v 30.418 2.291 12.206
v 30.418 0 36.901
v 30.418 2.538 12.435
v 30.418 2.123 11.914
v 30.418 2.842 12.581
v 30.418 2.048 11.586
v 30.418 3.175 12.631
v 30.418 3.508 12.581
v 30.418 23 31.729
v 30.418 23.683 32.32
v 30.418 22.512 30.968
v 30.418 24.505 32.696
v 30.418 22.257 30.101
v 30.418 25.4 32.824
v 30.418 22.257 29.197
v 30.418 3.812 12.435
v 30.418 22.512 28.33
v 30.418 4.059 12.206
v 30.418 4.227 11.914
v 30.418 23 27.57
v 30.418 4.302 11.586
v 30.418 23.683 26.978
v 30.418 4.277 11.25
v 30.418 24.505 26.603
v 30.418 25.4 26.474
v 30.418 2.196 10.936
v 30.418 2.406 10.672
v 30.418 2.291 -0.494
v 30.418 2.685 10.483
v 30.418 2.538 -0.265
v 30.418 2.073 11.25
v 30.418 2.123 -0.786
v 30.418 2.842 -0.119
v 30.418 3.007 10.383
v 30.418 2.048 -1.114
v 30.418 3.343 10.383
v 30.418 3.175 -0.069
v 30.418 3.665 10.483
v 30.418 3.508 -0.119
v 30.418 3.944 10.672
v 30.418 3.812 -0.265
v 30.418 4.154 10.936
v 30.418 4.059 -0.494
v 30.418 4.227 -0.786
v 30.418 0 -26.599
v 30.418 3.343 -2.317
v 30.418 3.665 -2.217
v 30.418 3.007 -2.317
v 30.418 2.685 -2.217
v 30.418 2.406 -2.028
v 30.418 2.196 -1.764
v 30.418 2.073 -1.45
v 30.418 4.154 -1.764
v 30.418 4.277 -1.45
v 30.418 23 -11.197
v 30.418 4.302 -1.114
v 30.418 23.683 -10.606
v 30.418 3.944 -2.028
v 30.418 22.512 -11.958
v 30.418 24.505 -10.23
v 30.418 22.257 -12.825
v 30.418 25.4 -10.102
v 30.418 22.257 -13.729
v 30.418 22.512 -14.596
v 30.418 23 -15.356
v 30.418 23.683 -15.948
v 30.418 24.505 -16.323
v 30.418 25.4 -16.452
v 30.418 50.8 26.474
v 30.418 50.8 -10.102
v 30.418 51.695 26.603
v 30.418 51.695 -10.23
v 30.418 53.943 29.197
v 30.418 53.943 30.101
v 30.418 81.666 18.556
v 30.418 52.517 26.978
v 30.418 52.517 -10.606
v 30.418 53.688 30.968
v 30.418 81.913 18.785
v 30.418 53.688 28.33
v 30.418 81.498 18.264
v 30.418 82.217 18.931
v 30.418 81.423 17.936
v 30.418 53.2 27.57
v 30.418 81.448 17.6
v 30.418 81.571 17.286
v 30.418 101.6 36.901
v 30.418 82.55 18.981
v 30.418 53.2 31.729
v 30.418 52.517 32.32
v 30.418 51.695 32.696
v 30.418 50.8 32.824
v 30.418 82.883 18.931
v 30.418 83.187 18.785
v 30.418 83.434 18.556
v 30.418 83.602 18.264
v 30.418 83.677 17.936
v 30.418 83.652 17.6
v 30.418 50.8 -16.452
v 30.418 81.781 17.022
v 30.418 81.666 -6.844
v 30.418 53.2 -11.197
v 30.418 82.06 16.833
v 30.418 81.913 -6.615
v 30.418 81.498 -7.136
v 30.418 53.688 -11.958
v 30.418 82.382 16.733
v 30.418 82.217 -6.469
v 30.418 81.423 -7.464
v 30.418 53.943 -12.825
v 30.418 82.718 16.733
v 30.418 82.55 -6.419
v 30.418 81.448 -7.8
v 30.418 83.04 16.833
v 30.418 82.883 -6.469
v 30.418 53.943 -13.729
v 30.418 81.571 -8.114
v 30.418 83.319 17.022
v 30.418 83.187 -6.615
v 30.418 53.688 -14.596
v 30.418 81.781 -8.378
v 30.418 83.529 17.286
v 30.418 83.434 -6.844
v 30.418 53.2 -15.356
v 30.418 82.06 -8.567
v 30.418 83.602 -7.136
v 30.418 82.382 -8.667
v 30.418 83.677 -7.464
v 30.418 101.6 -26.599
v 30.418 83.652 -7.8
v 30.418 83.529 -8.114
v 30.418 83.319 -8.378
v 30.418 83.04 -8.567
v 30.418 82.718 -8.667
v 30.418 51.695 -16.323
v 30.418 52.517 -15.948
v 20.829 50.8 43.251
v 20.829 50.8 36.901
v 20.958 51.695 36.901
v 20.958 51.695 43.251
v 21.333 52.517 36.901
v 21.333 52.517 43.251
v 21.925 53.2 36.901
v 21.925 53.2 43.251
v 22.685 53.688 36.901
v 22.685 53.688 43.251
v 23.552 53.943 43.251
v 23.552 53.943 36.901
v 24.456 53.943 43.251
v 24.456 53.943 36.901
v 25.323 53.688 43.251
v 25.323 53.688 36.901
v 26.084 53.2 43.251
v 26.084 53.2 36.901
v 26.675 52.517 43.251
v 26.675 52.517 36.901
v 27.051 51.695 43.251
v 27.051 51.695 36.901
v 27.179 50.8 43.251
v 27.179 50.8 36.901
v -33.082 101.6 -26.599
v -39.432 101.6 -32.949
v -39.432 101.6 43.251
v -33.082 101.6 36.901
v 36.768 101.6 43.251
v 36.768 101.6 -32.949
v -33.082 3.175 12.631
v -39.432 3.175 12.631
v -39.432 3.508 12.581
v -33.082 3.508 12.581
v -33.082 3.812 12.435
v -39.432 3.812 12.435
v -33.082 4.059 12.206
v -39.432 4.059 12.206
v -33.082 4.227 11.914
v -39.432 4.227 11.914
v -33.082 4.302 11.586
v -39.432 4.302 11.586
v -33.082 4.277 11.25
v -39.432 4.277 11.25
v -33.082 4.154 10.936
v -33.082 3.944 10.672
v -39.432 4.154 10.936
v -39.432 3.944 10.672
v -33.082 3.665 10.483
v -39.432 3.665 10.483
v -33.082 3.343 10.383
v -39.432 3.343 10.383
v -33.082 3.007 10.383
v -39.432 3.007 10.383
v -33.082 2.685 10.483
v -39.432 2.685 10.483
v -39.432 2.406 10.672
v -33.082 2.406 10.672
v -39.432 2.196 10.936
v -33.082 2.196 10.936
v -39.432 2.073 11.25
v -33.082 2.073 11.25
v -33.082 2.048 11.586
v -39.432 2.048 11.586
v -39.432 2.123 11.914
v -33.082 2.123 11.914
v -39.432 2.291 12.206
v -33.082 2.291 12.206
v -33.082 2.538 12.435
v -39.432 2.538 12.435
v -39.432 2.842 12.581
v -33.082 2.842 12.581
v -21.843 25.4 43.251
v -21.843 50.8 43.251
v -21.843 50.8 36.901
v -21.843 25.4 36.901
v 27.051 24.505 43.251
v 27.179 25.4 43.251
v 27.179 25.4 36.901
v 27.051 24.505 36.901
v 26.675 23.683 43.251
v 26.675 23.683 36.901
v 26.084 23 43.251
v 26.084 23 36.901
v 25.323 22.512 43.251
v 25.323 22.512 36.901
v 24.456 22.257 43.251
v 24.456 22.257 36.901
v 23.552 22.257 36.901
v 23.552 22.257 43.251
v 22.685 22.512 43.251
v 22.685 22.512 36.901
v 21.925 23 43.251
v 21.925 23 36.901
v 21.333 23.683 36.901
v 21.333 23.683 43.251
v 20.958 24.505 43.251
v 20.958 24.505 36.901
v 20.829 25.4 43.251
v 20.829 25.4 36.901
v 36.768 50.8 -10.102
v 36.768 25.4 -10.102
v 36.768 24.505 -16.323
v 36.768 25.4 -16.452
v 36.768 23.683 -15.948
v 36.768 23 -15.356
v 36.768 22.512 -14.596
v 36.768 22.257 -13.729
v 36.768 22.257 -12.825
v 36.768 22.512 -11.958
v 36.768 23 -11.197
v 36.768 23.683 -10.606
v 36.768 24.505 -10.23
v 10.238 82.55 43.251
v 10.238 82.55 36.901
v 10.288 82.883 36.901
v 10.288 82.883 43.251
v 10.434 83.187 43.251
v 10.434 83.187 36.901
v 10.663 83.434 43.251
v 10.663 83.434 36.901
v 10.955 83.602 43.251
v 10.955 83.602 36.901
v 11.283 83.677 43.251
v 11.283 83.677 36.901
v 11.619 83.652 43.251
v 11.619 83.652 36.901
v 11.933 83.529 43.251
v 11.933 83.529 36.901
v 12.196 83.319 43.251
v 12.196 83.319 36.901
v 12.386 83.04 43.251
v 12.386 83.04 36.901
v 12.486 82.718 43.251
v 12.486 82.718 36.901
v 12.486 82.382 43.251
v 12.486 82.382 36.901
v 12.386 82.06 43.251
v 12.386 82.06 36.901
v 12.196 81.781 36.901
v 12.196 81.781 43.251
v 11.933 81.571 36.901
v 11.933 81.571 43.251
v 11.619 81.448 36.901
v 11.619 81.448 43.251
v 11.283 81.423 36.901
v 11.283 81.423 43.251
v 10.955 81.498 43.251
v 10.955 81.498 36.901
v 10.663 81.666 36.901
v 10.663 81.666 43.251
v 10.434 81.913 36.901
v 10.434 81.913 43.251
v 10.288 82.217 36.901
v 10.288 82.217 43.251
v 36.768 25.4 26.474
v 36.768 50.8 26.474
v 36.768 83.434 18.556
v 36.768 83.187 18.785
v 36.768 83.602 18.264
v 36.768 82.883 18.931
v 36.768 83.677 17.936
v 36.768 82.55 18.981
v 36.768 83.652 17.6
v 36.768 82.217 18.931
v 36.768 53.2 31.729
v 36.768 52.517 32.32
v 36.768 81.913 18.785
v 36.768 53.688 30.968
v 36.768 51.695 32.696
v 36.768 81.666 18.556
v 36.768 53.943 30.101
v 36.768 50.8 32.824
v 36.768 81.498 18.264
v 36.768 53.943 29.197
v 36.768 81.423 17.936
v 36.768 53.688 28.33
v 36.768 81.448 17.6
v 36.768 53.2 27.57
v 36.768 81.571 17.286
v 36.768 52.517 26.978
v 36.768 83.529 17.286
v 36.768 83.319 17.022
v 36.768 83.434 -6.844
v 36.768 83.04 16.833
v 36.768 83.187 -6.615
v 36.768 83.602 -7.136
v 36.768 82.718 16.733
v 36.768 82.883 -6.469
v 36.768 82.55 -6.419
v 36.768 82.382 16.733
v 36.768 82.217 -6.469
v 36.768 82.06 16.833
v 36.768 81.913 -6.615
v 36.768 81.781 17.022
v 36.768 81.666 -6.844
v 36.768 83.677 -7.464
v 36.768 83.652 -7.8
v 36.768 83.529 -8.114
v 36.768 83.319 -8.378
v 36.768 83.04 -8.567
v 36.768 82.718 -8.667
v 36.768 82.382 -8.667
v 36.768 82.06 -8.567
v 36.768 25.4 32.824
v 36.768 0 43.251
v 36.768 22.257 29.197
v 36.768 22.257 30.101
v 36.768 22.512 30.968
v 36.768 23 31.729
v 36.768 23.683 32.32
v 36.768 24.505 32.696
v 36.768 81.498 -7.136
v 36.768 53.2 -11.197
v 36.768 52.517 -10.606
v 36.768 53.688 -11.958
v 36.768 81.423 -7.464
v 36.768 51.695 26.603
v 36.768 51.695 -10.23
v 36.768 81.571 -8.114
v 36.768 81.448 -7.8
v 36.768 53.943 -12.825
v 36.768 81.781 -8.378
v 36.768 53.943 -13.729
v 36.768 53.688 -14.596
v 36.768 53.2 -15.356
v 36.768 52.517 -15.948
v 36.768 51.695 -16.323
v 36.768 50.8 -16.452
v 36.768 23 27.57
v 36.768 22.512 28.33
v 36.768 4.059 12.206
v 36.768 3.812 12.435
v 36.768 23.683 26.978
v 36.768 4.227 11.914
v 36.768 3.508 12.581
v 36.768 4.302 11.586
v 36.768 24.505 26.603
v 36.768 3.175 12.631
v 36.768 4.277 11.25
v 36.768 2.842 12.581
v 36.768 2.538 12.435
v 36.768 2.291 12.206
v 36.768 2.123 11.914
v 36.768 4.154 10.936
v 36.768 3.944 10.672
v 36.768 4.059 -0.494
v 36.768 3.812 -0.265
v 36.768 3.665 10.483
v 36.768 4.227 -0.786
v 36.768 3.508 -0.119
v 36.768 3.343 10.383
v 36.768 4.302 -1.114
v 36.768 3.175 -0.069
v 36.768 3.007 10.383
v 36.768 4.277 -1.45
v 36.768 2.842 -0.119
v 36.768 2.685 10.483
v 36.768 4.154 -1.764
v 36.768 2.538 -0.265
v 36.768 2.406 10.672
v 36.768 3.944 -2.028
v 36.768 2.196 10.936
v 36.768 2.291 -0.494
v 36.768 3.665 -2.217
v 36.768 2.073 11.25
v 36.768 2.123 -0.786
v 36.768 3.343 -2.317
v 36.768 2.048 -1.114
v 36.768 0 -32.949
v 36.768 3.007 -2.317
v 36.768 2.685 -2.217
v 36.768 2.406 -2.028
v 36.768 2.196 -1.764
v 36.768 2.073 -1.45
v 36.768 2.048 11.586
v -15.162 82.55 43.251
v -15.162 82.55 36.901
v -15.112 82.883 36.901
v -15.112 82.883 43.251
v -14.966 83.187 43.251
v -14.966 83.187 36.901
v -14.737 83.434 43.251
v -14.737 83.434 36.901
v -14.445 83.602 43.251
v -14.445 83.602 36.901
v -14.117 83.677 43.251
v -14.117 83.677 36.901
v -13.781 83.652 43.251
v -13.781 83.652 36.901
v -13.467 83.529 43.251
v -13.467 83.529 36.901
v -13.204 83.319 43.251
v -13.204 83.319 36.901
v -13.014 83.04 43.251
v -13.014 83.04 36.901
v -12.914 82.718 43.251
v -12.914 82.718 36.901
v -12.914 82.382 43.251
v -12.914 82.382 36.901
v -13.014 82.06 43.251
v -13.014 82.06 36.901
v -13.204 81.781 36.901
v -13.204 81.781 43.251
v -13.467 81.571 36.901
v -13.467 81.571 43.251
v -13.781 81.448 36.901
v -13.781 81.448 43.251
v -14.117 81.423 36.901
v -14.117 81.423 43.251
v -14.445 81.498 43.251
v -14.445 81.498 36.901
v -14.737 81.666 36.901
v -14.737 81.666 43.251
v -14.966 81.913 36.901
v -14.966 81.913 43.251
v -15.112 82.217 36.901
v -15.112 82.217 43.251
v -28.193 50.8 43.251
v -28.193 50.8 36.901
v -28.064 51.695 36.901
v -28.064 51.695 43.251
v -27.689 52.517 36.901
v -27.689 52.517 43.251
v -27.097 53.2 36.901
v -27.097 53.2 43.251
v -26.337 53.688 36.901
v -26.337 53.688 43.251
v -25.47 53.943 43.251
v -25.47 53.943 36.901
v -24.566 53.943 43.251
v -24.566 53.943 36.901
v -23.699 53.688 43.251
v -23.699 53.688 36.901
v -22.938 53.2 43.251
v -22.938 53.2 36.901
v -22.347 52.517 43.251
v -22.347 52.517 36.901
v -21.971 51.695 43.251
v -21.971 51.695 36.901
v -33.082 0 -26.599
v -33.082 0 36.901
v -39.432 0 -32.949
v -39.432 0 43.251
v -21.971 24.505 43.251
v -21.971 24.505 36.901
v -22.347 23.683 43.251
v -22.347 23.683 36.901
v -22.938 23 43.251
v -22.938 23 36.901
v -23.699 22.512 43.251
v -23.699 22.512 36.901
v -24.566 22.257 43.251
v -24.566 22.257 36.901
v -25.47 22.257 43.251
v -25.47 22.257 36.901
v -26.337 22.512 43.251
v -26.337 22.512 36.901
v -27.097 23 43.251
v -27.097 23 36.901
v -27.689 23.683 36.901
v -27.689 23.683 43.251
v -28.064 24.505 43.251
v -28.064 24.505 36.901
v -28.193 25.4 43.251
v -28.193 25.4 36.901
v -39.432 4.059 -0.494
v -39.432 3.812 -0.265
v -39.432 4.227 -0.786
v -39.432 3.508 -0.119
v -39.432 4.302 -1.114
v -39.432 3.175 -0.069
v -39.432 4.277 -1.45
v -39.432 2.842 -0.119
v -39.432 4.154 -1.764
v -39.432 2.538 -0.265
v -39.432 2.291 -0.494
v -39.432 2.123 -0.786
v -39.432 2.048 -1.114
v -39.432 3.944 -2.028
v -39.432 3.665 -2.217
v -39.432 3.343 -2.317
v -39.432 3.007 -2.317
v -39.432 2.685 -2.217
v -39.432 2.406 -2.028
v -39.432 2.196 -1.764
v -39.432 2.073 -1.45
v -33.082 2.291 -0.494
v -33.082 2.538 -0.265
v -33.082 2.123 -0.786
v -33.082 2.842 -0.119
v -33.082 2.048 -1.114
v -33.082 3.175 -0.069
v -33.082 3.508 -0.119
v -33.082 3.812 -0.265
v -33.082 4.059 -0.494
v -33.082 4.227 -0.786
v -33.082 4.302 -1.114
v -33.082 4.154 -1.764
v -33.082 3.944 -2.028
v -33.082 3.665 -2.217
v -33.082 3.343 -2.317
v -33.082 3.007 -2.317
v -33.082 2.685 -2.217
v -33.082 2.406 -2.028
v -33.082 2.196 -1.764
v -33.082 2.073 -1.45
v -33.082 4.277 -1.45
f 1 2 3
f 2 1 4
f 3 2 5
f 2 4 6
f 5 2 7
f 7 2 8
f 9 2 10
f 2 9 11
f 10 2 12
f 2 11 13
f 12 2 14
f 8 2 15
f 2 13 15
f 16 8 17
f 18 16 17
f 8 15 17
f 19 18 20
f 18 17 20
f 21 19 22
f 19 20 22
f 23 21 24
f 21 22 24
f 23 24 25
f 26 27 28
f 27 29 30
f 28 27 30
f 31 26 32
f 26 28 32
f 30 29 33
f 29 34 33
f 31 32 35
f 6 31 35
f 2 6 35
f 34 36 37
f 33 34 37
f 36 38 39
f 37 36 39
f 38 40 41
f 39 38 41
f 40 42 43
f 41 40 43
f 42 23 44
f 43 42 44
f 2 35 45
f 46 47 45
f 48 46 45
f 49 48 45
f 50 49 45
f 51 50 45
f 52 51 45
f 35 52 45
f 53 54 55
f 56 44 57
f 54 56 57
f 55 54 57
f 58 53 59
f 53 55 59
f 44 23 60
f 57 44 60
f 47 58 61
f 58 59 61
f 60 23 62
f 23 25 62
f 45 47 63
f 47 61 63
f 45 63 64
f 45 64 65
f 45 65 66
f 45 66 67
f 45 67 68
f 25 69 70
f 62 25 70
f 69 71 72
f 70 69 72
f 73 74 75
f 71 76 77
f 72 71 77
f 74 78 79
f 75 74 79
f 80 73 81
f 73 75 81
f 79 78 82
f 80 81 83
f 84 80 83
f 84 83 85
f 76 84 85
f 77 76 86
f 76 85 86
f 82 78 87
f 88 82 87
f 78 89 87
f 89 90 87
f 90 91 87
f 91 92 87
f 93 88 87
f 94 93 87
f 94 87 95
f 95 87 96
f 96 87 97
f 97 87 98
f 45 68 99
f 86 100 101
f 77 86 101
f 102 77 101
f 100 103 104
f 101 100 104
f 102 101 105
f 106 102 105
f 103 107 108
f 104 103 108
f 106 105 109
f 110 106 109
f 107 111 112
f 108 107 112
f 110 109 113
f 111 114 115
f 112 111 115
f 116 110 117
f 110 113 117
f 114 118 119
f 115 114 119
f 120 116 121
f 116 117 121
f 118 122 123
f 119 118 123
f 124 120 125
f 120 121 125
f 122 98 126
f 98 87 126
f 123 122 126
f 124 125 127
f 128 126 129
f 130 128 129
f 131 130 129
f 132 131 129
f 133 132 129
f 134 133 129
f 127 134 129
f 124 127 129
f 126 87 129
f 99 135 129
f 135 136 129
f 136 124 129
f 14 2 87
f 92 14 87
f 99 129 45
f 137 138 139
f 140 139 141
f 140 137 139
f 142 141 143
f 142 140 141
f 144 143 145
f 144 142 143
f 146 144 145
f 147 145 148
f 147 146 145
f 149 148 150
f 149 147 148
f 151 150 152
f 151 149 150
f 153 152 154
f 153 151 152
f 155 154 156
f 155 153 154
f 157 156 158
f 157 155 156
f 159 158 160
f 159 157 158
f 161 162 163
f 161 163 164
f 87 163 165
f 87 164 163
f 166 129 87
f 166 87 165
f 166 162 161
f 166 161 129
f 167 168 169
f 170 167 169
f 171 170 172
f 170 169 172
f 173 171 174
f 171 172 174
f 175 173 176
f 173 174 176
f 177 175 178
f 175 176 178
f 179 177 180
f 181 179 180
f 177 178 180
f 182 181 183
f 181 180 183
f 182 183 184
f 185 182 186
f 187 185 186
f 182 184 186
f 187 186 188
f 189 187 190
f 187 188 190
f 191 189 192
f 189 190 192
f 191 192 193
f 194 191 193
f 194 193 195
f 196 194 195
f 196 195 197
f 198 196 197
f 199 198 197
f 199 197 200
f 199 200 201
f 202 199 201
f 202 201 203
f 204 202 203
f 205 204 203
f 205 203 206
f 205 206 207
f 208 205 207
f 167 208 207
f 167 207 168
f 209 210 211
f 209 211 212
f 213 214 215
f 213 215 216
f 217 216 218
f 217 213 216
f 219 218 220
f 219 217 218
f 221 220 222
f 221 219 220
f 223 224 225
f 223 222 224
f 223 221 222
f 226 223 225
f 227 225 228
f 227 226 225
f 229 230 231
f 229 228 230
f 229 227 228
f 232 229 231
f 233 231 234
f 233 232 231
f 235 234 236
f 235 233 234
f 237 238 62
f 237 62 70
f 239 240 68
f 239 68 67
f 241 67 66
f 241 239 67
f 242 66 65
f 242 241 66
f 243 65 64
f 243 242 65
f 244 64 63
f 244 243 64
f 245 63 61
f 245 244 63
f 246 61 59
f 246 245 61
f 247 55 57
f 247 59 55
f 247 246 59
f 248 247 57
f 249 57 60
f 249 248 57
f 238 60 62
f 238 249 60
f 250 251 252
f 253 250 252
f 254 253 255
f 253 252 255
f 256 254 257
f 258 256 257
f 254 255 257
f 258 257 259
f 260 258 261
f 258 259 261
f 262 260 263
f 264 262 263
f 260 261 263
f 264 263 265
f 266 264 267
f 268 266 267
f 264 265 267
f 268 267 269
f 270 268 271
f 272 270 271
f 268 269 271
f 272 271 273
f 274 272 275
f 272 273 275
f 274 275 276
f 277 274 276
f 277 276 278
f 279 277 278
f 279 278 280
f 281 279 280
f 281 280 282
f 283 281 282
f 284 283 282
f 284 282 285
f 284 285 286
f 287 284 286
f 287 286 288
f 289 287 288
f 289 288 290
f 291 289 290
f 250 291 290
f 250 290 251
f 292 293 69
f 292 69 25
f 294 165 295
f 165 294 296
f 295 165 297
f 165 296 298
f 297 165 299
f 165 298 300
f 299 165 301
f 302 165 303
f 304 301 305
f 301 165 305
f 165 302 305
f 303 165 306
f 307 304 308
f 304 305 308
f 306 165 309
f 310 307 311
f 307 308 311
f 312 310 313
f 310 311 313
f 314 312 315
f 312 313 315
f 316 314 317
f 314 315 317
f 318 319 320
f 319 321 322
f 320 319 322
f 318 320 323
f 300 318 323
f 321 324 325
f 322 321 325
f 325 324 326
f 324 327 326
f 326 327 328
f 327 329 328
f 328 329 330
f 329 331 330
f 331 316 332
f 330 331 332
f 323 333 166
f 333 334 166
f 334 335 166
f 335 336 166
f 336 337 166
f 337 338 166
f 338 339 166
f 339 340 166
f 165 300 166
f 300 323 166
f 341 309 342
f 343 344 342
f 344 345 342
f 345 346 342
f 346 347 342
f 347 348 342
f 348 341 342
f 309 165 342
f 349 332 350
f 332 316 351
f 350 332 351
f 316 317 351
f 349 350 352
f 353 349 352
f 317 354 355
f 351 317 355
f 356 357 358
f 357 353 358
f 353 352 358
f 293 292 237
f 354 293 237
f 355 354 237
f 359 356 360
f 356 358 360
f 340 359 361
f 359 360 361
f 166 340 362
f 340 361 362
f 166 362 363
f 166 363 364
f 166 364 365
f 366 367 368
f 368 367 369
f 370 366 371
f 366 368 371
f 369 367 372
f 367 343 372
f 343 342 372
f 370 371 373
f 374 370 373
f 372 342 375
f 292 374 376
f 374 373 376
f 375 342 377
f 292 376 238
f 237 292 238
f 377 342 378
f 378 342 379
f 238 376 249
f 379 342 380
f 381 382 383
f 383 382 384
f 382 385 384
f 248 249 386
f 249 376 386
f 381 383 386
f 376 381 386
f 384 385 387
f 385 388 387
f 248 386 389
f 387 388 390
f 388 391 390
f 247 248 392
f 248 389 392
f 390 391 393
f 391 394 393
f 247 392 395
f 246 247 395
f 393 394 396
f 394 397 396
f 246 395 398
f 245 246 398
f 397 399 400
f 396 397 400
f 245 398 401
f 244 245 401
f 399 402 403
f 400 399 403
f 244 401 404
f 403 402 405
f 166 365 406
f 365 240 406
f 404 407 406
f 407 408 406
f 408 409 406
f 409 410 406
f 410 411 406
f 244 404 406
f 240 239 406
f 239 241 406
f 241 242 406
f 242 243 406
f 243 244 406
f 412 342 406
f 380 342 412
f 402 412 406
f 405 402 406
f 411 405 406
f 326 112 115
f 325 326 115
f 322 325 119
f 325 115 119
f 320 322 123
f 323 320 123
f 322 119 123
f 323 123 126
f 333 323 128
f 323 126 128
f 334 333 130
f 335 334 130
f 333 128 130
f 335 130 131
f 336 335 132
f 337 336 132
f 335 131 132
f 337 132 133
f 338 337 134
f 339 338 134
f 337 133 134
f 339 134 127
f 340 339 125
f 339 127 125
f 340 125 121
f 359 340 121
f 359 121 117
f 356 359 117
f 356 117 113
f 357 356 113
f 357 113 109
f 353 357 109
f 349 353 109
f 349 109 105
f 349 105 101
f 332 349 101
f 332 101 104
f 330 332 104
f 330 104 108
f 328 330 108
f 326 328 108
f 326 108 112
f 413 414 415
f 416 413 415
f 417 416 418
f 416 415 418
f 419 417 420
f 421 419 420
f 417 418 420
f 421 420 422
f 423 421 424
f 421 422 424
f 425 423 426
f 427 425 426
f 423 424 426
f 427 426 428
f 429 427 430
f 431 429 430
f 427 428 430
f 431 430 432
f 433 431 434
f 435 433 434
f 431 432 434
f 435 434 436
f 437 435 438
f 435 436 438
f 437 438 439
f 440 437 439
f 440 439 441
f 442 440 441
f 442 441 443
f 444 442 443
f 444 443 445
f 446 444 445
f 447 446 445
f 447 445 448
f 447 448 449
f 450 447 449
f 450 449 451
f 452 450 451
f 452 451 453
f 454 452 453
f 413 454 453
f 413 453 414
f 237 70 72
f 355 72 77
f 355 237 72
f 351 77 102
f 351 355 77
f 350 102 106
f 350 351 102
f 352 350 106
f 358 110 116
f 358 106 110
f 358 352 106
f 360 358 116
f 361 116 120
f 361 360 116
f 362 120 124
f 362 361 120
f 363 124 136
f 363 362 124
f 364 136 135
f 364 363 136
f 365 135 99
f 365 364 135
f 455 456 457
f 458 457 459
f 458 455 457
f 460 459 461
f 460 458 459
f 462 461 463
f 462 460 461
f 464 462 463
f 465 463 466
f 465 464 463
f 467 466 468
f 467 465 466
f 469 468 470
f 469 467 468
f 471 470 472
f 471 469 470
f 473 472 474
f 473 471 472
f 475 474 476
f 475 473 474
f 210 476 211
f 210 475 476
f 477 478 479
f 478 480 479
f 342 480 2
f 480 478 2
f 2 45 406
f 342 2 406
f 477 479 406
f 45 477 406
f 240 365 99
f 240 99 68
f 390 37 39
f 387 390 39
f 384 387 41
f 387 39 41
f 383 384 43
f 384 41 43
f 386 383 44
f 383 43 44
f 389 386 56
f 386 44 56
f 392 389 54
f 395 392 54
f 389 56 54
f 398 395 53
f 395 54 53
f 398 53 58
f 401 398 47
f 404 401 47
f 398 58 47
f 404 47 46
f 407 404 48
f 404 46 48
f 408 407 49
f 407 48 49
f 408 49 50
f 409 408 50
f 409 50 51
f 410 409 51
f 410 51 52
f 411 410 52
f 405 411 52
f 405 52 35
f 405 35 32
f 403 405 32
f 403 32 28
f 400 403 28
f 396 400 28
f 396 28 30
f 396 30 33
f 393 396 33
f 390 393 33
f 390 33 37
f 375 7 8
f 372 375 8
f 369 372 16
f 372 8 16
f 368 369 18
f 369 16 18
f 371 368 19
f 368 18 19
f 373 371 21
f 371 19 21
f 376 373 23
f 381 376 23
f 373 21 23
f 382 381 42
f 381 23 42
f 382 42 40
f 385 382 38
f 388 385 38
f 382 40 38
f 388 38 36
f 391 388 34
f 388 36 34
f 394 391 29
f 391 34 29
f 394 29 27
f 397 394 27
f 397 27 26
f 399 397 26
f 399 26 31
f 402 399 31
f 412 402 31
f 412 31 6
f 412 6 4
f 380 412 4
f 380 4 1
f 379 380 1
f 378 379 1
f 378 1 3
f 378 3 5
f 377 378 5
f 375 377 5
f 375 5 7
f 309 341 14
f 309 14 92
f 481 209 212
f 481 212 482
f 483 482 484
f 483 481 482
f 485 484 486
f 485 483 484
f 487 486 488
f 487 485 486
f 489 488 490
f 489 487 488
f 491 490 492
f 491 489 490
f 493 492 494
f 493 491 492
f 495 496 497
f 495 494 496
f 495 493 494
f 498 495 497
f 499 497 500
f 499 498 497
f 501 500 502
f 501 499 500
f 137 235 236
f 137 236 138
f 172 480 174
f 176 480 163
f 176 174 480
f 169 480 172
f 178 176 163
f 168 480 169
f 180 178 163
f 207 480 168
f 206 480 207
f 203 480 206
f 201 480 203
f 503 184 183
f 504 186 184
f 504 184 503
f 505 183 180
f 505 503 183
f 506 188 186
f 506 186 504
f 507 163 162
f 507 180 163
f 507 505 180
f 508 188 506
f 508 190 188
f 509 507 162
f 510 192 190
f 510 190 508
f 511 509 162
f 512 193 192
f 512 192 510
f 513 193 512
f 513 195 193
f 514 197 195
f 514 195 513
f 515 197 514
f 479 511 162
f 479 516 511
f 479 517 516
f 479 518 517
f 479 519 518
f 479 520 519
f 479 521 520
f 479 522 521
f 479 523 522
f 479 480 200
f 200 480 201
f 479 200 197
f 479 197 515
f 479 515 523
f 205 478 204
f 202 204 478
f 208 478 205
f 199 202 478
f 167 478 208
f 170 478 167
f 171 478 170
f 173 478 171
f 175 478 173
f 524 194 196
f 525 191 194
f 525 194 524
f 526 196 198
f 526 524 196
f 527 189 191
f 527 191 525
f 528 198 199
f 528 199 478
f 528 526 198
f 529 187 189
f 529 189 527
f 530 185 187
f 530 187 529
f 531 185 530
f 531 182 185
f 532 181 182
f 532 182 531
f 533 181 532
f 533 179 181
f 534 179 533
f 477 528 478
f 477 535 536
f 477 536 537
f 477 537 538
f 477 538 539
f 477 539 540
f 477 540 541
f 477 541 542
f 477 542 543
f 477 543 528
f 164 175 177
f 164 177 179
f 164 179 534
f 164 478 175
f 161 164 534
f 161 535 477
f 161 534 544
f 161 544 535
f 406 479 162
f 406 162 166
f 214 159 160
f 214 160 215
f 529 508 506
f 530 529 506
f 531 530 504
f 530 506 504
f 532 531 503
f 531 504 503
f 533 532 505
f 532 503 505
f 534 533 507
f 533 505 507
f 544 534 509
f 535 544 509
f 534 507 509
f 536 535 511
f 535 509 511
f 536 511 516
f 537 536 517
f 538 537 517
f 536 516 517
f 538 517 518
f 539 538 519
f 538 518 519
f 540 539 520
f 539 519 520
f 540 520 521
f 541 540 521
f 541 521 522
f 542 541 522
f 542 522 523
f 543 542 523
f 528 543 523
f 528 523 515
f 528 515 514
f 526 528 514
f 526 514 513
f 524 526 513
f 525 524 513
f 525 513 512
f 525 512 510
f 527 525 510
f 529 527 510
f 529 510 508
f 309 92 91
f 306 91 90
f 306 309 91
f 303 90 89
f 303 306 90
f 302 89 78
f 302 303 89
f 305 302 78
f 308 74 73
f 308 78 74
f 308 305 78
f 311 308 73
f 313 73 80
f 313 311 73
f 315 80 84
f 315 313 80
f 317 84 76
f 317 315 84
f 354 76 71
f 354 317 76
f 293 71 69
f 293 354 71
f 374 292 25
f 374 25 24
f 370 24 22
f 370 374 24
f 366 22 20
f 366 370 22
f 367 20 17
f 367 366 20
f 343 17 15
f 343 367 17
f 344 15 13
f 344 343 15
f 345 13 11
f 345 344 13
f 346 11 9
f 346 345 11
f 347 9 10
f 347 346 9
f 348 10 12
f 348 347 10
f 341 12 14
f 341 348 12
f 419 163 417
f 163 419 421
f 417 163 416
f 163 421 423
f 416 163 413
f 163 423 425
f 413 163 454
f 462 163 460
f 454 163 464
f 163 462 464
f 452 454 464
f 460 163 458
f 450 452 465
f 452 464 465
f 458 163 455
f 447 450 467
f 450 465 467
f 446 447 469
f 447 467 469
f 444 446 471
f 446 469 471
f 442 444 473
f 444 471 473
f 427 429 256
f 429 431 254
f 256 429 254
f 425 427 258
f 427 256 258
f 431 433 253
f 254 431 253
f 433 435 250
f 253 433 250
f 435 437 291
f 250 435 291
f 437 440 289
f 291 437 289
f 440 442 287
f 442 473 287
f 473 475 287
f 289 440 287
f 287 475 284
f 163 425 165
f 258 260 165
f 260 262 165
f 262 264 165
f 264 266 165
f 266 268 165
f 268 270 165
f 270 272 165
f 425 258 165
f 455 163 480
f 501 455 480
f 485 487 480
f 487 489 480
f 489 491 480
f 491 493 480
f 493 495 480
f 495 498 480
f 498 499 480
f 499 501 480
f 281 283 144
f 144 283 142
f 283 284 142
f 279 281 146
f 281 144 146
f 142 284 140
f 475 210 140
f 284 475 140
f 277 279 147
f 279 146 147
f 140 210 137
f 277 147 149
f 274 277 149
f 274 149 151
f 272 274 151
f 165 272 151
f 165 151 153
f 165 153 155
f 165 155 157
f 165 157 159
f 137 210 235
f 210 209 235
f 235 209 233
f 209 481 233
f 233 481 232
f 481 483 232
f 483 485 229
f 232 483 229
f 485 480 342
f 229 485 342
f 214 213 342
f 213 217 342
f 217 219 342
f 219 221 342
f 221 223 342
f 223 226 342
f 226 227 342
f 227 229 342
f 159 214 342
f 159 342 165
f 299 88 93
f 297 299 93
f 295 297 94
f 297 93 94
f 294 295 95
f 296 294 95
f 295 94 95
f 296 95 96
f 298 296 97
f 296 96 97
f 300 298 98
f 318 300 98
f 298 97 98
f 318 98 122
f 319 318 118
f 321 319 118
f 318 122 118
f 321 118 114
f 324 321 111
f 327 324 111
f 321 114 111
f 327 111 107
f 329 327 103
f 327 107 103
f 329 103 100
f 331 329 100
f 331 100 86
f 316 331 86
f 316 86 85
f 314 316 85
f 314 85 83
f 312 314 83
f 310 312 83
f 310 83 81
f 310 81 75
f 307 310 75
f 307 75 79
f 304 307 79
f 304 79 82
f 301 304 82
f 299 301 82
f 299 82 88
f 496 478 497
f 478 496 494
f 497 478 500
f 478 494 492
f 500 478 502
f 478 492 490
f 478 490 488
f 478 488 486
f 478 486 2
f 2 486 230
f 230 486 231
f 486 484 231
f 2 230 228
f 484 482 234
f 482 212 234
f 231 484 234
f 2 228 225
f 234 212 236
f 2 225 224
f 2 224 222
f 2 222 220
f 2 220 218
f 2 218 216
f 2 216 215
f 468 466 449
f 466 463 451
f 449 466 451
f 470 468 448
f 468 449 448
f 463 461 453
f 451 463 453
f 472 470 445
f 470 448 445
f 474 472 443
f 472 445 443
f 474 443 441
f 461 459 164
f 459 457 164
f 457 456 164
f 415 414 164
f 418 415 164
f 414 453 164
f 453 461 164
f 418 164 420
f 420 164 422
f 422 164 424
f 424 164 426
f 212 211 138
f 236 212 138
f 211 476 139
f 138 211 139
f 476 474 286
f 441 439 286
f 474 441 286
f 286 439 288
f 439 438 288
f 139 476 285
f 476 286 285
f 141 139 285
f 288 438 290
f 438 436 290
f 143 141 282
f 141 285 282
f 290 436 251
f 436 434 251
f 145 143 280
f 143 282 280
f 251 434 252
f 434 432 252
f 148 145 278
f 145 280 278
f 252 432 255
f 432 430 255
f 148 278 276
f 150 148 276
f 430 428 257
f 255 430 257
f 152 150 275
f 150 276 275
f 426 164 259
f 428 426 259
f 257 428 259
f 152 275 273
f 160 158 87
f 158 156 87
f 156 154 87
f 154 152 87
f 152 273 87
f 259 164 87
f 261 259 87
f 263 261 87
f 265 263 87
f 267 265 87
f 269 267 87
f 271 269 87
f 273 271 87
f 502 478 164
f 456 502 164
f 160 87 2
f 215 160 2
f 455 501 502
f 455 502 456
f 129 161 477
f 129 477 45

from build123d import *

# Parameters (mm, degrees)
SKETCH2_W                 = 76.2
SKETCH2_H                 = 76.2
BOSS_EXTRUDE1_DEPTH       = 101.6
SKETCH3_W                 = 63.5
SKETCH3_H                 = 63.5
CUT_EXTRUDE1_DEPTH        = 102.6
CUT_EXTRUDE2_REACH        = 78.2
CUT_EXTRUDE3_REACH        = 78.2
F_4_40_TAPPED_HOLE1_D     = 2.2606
F_4_40_TAPPED_HOLE1_DEPTH = 6.35
F_4_40_TAPPED_HOLE2_D     = 2.2606
F_4_40_TAPPED_HOLE2_DEPTH = 6.35
F_4_40_TAPPED_HOLE3_D     = 2.2606


with BuildPart() as part:
    # Sketch2 → Boss-Extrude1 (new body)
    with BuildSketch(Plane(origin=(0, 0, 0), x_dir=(1, 0, 0), z_dir=(0, 1, 0))):
        with Locations((-1.332167832, -5.151048951)):
            Rectangle(SKETCH2_W, SKETCH2_H)
    extrude(amount=BOSS_EXTRUDE1_DEPTH)

    # Sketch3 → Cut-Extrude1 (cut, through all)
    with BuildSketch(Plane(origin=(0, 101.6, 0), x_dir=(1, 0, 0), z_dir=(0, 1, 0))):
        with Locations((-1.332167832, -5.151048951)):
            Rectangle(SKETCH3_W, SKETCH3_H)
    extrude(amount=-CUT_EXTRUDE1_DEPTH, mode=Mode.SUBTRACT)

    # Sketch4 → Cut-Extrude2 (cut, up to next)
    with BuildSketch(Plane.XY.offset(43.251048951), mode=Mode.PRIVATE) as cut_extrude2_sk1:
        with BuildLine():
            Line((-28.192667832, 25.4), (-28.192667832, 50.8))
            ThreePointArc((-28.192667832, 50.8), (-25.017667832, 53.975), (-21.842667832, 50.8))
            Line((-21.842667832, 50.8), (-21.842667832, 25.4))
            ThreePointArc((-21.842667832, 25.4), (-25.017667832, 22.225), (-28.192667832, 25.4))
        make_face()
    cut_extrude2_tool1 = extrude(cut_extrude2_sk1.sketch, amount=-CUT_EXTRUDE2_REACH, mode=Mode.PRIVATE) & part.part
    add(cut_extrude2_tool1.solids().sort_by_distance((-25.017668, 38.1, 43.251049))[0], mode=Mode.SUBTRACT)
    # Sketch4 → Cut-Extrude2 (cut, up to next)
    with BuildSketch(Plane.XY.offset(43.251048951), mode=Mode.PRIVATE) as cut_extrude2_sk2:
        with BuildLine():
            Line((20.829332168, 25.4), (20.829332168, 50.8))
            ThreePointArc((20.829332168, 50.8), (24.004332168, 53.975), (27.179332168, 50.8))
            Line((27.179332168, 50.8), (27.179332168, 25.4))
            ThreePointArc((27.179332168, 25.4), (24.004332168, 22.225), (20.829332168, 25.4))
        make_face()
    cut_extrude2_tool2 = extrude(cut_extrude2_sk2.sketch, amount=-CUT_EXTRUDE2_REACH, mode=Mode.PRIVATE) & part.part
    add(cut_extrude2_tool2.solids().sort_by_distance((24.004332, 38.1, 43.251049))[0], mode=Mode.SUBTRACT)

    # Sketch5 → Cut-Extrude3 (cut, up to next)
    with BuildSketch(Plane(origin=(36.767832168, 0, 0), x_dir=(0, 0, -1), z_dir=(1, 0, 0)), mode=Mode.PRIVATE) as cut_extrude3_sk1:
        with BuildLine():
            Line((-32.824348951, 25.4), (-32.824348951, 50.8))
            ThreePointArc((-32.824348951, 50.8), (-29.649348951, 53.975), (-26.474348951, 50.8))
            Line((-26.474348951, 50.8), (-26.474348951, 25.4))
            ThreePointArc((-26.474348951, 25.4), (-29.649348951, 22.225), (-32.824348951, 25.4))
        make_face()
    cut_extrude3_tool1 = extrude(cut_extrude3_sk1.sketch, amount=-CUT_EXTRUDE3_REACH, mode=Mode.PRIVATE) & part.part
    add(cut_extrude3_tool1.solids().sort_by_distance((36.767832, 38.1, 29.649349))[0], mode=Mode.SUBTRACT)
    # Sketch5 → Cut-Extrude3 (cut, up to next)
    with BuildSketch(Plane(origin=(36.767832168, 0, 0), x_dir=(0, 0, -1), z_dir=(1, 0, 0)), mode=Mode.PRIVATE) as cut_extrude3_sk2:
        with BuildLine():
            Line((10.101651049, 25.4), (10.101651049, 50.8))
            ThreePointArc((10.101651049, 50.8), (13.276651049, 53.975), (16.451651049, 50.8))
            Line((16.451651049, 50.8), (16.451651049, 25.4))
            ThreePointArc((16.451651049, 25.4), (13.276651049, 22.225), (10.101651049, 25.4))
        make_face()
    cut_extrude3_tool2 = extrude(cut_extrude3_sk2.sketch, amount=-CUT_EXTRUDE3_REACH, mode=Mode.PRIVATE) & part.part
    add(cut_extrude3_tool2.solids().sort_by_distance((36.767832, 38.1, -13.276651))[0], mode=Mode.SUBTRACT)

    # #4-40 Tapped Hole1
    with Locations(Plane.XY.offset(43.251048951)):
        with Locations((-14.032167832, 82.55), (11.367832168, 82.55)):
            Hole(F_4_40_TAPPED_HOLE1_D / 2, depth=F_4_40_TAPPED_HOLE1_DEPTH)

    # #4-40 Tapped Hole2
    with Locations(Plane(origin=(36.767832168, 0, 0), x_dir=(0, 0, -1), z_dir=(1, 0, 0))):
        with Locations((-17.851048951, 82.55), (7.548951049, 82.55)):
            Hole(F_4_40_TAPPED_HOLE2_D / 2, depth=F_4_40_TAPPED_HOLE2_DEPTH)

    # #4-40 Tapped Hole3 (through all)
    with Locations(Plane(origin=(36.767832168, 0, 0), x_dir=(0, 0, -1), z_dir=(1, 0, 0))):
        with Locations((1.198951049, 3.175), (-11.501048951, 3.175)):
            Hole(F_4_40_TAPPED_HOLE3_D / 2)


solid = part.part
